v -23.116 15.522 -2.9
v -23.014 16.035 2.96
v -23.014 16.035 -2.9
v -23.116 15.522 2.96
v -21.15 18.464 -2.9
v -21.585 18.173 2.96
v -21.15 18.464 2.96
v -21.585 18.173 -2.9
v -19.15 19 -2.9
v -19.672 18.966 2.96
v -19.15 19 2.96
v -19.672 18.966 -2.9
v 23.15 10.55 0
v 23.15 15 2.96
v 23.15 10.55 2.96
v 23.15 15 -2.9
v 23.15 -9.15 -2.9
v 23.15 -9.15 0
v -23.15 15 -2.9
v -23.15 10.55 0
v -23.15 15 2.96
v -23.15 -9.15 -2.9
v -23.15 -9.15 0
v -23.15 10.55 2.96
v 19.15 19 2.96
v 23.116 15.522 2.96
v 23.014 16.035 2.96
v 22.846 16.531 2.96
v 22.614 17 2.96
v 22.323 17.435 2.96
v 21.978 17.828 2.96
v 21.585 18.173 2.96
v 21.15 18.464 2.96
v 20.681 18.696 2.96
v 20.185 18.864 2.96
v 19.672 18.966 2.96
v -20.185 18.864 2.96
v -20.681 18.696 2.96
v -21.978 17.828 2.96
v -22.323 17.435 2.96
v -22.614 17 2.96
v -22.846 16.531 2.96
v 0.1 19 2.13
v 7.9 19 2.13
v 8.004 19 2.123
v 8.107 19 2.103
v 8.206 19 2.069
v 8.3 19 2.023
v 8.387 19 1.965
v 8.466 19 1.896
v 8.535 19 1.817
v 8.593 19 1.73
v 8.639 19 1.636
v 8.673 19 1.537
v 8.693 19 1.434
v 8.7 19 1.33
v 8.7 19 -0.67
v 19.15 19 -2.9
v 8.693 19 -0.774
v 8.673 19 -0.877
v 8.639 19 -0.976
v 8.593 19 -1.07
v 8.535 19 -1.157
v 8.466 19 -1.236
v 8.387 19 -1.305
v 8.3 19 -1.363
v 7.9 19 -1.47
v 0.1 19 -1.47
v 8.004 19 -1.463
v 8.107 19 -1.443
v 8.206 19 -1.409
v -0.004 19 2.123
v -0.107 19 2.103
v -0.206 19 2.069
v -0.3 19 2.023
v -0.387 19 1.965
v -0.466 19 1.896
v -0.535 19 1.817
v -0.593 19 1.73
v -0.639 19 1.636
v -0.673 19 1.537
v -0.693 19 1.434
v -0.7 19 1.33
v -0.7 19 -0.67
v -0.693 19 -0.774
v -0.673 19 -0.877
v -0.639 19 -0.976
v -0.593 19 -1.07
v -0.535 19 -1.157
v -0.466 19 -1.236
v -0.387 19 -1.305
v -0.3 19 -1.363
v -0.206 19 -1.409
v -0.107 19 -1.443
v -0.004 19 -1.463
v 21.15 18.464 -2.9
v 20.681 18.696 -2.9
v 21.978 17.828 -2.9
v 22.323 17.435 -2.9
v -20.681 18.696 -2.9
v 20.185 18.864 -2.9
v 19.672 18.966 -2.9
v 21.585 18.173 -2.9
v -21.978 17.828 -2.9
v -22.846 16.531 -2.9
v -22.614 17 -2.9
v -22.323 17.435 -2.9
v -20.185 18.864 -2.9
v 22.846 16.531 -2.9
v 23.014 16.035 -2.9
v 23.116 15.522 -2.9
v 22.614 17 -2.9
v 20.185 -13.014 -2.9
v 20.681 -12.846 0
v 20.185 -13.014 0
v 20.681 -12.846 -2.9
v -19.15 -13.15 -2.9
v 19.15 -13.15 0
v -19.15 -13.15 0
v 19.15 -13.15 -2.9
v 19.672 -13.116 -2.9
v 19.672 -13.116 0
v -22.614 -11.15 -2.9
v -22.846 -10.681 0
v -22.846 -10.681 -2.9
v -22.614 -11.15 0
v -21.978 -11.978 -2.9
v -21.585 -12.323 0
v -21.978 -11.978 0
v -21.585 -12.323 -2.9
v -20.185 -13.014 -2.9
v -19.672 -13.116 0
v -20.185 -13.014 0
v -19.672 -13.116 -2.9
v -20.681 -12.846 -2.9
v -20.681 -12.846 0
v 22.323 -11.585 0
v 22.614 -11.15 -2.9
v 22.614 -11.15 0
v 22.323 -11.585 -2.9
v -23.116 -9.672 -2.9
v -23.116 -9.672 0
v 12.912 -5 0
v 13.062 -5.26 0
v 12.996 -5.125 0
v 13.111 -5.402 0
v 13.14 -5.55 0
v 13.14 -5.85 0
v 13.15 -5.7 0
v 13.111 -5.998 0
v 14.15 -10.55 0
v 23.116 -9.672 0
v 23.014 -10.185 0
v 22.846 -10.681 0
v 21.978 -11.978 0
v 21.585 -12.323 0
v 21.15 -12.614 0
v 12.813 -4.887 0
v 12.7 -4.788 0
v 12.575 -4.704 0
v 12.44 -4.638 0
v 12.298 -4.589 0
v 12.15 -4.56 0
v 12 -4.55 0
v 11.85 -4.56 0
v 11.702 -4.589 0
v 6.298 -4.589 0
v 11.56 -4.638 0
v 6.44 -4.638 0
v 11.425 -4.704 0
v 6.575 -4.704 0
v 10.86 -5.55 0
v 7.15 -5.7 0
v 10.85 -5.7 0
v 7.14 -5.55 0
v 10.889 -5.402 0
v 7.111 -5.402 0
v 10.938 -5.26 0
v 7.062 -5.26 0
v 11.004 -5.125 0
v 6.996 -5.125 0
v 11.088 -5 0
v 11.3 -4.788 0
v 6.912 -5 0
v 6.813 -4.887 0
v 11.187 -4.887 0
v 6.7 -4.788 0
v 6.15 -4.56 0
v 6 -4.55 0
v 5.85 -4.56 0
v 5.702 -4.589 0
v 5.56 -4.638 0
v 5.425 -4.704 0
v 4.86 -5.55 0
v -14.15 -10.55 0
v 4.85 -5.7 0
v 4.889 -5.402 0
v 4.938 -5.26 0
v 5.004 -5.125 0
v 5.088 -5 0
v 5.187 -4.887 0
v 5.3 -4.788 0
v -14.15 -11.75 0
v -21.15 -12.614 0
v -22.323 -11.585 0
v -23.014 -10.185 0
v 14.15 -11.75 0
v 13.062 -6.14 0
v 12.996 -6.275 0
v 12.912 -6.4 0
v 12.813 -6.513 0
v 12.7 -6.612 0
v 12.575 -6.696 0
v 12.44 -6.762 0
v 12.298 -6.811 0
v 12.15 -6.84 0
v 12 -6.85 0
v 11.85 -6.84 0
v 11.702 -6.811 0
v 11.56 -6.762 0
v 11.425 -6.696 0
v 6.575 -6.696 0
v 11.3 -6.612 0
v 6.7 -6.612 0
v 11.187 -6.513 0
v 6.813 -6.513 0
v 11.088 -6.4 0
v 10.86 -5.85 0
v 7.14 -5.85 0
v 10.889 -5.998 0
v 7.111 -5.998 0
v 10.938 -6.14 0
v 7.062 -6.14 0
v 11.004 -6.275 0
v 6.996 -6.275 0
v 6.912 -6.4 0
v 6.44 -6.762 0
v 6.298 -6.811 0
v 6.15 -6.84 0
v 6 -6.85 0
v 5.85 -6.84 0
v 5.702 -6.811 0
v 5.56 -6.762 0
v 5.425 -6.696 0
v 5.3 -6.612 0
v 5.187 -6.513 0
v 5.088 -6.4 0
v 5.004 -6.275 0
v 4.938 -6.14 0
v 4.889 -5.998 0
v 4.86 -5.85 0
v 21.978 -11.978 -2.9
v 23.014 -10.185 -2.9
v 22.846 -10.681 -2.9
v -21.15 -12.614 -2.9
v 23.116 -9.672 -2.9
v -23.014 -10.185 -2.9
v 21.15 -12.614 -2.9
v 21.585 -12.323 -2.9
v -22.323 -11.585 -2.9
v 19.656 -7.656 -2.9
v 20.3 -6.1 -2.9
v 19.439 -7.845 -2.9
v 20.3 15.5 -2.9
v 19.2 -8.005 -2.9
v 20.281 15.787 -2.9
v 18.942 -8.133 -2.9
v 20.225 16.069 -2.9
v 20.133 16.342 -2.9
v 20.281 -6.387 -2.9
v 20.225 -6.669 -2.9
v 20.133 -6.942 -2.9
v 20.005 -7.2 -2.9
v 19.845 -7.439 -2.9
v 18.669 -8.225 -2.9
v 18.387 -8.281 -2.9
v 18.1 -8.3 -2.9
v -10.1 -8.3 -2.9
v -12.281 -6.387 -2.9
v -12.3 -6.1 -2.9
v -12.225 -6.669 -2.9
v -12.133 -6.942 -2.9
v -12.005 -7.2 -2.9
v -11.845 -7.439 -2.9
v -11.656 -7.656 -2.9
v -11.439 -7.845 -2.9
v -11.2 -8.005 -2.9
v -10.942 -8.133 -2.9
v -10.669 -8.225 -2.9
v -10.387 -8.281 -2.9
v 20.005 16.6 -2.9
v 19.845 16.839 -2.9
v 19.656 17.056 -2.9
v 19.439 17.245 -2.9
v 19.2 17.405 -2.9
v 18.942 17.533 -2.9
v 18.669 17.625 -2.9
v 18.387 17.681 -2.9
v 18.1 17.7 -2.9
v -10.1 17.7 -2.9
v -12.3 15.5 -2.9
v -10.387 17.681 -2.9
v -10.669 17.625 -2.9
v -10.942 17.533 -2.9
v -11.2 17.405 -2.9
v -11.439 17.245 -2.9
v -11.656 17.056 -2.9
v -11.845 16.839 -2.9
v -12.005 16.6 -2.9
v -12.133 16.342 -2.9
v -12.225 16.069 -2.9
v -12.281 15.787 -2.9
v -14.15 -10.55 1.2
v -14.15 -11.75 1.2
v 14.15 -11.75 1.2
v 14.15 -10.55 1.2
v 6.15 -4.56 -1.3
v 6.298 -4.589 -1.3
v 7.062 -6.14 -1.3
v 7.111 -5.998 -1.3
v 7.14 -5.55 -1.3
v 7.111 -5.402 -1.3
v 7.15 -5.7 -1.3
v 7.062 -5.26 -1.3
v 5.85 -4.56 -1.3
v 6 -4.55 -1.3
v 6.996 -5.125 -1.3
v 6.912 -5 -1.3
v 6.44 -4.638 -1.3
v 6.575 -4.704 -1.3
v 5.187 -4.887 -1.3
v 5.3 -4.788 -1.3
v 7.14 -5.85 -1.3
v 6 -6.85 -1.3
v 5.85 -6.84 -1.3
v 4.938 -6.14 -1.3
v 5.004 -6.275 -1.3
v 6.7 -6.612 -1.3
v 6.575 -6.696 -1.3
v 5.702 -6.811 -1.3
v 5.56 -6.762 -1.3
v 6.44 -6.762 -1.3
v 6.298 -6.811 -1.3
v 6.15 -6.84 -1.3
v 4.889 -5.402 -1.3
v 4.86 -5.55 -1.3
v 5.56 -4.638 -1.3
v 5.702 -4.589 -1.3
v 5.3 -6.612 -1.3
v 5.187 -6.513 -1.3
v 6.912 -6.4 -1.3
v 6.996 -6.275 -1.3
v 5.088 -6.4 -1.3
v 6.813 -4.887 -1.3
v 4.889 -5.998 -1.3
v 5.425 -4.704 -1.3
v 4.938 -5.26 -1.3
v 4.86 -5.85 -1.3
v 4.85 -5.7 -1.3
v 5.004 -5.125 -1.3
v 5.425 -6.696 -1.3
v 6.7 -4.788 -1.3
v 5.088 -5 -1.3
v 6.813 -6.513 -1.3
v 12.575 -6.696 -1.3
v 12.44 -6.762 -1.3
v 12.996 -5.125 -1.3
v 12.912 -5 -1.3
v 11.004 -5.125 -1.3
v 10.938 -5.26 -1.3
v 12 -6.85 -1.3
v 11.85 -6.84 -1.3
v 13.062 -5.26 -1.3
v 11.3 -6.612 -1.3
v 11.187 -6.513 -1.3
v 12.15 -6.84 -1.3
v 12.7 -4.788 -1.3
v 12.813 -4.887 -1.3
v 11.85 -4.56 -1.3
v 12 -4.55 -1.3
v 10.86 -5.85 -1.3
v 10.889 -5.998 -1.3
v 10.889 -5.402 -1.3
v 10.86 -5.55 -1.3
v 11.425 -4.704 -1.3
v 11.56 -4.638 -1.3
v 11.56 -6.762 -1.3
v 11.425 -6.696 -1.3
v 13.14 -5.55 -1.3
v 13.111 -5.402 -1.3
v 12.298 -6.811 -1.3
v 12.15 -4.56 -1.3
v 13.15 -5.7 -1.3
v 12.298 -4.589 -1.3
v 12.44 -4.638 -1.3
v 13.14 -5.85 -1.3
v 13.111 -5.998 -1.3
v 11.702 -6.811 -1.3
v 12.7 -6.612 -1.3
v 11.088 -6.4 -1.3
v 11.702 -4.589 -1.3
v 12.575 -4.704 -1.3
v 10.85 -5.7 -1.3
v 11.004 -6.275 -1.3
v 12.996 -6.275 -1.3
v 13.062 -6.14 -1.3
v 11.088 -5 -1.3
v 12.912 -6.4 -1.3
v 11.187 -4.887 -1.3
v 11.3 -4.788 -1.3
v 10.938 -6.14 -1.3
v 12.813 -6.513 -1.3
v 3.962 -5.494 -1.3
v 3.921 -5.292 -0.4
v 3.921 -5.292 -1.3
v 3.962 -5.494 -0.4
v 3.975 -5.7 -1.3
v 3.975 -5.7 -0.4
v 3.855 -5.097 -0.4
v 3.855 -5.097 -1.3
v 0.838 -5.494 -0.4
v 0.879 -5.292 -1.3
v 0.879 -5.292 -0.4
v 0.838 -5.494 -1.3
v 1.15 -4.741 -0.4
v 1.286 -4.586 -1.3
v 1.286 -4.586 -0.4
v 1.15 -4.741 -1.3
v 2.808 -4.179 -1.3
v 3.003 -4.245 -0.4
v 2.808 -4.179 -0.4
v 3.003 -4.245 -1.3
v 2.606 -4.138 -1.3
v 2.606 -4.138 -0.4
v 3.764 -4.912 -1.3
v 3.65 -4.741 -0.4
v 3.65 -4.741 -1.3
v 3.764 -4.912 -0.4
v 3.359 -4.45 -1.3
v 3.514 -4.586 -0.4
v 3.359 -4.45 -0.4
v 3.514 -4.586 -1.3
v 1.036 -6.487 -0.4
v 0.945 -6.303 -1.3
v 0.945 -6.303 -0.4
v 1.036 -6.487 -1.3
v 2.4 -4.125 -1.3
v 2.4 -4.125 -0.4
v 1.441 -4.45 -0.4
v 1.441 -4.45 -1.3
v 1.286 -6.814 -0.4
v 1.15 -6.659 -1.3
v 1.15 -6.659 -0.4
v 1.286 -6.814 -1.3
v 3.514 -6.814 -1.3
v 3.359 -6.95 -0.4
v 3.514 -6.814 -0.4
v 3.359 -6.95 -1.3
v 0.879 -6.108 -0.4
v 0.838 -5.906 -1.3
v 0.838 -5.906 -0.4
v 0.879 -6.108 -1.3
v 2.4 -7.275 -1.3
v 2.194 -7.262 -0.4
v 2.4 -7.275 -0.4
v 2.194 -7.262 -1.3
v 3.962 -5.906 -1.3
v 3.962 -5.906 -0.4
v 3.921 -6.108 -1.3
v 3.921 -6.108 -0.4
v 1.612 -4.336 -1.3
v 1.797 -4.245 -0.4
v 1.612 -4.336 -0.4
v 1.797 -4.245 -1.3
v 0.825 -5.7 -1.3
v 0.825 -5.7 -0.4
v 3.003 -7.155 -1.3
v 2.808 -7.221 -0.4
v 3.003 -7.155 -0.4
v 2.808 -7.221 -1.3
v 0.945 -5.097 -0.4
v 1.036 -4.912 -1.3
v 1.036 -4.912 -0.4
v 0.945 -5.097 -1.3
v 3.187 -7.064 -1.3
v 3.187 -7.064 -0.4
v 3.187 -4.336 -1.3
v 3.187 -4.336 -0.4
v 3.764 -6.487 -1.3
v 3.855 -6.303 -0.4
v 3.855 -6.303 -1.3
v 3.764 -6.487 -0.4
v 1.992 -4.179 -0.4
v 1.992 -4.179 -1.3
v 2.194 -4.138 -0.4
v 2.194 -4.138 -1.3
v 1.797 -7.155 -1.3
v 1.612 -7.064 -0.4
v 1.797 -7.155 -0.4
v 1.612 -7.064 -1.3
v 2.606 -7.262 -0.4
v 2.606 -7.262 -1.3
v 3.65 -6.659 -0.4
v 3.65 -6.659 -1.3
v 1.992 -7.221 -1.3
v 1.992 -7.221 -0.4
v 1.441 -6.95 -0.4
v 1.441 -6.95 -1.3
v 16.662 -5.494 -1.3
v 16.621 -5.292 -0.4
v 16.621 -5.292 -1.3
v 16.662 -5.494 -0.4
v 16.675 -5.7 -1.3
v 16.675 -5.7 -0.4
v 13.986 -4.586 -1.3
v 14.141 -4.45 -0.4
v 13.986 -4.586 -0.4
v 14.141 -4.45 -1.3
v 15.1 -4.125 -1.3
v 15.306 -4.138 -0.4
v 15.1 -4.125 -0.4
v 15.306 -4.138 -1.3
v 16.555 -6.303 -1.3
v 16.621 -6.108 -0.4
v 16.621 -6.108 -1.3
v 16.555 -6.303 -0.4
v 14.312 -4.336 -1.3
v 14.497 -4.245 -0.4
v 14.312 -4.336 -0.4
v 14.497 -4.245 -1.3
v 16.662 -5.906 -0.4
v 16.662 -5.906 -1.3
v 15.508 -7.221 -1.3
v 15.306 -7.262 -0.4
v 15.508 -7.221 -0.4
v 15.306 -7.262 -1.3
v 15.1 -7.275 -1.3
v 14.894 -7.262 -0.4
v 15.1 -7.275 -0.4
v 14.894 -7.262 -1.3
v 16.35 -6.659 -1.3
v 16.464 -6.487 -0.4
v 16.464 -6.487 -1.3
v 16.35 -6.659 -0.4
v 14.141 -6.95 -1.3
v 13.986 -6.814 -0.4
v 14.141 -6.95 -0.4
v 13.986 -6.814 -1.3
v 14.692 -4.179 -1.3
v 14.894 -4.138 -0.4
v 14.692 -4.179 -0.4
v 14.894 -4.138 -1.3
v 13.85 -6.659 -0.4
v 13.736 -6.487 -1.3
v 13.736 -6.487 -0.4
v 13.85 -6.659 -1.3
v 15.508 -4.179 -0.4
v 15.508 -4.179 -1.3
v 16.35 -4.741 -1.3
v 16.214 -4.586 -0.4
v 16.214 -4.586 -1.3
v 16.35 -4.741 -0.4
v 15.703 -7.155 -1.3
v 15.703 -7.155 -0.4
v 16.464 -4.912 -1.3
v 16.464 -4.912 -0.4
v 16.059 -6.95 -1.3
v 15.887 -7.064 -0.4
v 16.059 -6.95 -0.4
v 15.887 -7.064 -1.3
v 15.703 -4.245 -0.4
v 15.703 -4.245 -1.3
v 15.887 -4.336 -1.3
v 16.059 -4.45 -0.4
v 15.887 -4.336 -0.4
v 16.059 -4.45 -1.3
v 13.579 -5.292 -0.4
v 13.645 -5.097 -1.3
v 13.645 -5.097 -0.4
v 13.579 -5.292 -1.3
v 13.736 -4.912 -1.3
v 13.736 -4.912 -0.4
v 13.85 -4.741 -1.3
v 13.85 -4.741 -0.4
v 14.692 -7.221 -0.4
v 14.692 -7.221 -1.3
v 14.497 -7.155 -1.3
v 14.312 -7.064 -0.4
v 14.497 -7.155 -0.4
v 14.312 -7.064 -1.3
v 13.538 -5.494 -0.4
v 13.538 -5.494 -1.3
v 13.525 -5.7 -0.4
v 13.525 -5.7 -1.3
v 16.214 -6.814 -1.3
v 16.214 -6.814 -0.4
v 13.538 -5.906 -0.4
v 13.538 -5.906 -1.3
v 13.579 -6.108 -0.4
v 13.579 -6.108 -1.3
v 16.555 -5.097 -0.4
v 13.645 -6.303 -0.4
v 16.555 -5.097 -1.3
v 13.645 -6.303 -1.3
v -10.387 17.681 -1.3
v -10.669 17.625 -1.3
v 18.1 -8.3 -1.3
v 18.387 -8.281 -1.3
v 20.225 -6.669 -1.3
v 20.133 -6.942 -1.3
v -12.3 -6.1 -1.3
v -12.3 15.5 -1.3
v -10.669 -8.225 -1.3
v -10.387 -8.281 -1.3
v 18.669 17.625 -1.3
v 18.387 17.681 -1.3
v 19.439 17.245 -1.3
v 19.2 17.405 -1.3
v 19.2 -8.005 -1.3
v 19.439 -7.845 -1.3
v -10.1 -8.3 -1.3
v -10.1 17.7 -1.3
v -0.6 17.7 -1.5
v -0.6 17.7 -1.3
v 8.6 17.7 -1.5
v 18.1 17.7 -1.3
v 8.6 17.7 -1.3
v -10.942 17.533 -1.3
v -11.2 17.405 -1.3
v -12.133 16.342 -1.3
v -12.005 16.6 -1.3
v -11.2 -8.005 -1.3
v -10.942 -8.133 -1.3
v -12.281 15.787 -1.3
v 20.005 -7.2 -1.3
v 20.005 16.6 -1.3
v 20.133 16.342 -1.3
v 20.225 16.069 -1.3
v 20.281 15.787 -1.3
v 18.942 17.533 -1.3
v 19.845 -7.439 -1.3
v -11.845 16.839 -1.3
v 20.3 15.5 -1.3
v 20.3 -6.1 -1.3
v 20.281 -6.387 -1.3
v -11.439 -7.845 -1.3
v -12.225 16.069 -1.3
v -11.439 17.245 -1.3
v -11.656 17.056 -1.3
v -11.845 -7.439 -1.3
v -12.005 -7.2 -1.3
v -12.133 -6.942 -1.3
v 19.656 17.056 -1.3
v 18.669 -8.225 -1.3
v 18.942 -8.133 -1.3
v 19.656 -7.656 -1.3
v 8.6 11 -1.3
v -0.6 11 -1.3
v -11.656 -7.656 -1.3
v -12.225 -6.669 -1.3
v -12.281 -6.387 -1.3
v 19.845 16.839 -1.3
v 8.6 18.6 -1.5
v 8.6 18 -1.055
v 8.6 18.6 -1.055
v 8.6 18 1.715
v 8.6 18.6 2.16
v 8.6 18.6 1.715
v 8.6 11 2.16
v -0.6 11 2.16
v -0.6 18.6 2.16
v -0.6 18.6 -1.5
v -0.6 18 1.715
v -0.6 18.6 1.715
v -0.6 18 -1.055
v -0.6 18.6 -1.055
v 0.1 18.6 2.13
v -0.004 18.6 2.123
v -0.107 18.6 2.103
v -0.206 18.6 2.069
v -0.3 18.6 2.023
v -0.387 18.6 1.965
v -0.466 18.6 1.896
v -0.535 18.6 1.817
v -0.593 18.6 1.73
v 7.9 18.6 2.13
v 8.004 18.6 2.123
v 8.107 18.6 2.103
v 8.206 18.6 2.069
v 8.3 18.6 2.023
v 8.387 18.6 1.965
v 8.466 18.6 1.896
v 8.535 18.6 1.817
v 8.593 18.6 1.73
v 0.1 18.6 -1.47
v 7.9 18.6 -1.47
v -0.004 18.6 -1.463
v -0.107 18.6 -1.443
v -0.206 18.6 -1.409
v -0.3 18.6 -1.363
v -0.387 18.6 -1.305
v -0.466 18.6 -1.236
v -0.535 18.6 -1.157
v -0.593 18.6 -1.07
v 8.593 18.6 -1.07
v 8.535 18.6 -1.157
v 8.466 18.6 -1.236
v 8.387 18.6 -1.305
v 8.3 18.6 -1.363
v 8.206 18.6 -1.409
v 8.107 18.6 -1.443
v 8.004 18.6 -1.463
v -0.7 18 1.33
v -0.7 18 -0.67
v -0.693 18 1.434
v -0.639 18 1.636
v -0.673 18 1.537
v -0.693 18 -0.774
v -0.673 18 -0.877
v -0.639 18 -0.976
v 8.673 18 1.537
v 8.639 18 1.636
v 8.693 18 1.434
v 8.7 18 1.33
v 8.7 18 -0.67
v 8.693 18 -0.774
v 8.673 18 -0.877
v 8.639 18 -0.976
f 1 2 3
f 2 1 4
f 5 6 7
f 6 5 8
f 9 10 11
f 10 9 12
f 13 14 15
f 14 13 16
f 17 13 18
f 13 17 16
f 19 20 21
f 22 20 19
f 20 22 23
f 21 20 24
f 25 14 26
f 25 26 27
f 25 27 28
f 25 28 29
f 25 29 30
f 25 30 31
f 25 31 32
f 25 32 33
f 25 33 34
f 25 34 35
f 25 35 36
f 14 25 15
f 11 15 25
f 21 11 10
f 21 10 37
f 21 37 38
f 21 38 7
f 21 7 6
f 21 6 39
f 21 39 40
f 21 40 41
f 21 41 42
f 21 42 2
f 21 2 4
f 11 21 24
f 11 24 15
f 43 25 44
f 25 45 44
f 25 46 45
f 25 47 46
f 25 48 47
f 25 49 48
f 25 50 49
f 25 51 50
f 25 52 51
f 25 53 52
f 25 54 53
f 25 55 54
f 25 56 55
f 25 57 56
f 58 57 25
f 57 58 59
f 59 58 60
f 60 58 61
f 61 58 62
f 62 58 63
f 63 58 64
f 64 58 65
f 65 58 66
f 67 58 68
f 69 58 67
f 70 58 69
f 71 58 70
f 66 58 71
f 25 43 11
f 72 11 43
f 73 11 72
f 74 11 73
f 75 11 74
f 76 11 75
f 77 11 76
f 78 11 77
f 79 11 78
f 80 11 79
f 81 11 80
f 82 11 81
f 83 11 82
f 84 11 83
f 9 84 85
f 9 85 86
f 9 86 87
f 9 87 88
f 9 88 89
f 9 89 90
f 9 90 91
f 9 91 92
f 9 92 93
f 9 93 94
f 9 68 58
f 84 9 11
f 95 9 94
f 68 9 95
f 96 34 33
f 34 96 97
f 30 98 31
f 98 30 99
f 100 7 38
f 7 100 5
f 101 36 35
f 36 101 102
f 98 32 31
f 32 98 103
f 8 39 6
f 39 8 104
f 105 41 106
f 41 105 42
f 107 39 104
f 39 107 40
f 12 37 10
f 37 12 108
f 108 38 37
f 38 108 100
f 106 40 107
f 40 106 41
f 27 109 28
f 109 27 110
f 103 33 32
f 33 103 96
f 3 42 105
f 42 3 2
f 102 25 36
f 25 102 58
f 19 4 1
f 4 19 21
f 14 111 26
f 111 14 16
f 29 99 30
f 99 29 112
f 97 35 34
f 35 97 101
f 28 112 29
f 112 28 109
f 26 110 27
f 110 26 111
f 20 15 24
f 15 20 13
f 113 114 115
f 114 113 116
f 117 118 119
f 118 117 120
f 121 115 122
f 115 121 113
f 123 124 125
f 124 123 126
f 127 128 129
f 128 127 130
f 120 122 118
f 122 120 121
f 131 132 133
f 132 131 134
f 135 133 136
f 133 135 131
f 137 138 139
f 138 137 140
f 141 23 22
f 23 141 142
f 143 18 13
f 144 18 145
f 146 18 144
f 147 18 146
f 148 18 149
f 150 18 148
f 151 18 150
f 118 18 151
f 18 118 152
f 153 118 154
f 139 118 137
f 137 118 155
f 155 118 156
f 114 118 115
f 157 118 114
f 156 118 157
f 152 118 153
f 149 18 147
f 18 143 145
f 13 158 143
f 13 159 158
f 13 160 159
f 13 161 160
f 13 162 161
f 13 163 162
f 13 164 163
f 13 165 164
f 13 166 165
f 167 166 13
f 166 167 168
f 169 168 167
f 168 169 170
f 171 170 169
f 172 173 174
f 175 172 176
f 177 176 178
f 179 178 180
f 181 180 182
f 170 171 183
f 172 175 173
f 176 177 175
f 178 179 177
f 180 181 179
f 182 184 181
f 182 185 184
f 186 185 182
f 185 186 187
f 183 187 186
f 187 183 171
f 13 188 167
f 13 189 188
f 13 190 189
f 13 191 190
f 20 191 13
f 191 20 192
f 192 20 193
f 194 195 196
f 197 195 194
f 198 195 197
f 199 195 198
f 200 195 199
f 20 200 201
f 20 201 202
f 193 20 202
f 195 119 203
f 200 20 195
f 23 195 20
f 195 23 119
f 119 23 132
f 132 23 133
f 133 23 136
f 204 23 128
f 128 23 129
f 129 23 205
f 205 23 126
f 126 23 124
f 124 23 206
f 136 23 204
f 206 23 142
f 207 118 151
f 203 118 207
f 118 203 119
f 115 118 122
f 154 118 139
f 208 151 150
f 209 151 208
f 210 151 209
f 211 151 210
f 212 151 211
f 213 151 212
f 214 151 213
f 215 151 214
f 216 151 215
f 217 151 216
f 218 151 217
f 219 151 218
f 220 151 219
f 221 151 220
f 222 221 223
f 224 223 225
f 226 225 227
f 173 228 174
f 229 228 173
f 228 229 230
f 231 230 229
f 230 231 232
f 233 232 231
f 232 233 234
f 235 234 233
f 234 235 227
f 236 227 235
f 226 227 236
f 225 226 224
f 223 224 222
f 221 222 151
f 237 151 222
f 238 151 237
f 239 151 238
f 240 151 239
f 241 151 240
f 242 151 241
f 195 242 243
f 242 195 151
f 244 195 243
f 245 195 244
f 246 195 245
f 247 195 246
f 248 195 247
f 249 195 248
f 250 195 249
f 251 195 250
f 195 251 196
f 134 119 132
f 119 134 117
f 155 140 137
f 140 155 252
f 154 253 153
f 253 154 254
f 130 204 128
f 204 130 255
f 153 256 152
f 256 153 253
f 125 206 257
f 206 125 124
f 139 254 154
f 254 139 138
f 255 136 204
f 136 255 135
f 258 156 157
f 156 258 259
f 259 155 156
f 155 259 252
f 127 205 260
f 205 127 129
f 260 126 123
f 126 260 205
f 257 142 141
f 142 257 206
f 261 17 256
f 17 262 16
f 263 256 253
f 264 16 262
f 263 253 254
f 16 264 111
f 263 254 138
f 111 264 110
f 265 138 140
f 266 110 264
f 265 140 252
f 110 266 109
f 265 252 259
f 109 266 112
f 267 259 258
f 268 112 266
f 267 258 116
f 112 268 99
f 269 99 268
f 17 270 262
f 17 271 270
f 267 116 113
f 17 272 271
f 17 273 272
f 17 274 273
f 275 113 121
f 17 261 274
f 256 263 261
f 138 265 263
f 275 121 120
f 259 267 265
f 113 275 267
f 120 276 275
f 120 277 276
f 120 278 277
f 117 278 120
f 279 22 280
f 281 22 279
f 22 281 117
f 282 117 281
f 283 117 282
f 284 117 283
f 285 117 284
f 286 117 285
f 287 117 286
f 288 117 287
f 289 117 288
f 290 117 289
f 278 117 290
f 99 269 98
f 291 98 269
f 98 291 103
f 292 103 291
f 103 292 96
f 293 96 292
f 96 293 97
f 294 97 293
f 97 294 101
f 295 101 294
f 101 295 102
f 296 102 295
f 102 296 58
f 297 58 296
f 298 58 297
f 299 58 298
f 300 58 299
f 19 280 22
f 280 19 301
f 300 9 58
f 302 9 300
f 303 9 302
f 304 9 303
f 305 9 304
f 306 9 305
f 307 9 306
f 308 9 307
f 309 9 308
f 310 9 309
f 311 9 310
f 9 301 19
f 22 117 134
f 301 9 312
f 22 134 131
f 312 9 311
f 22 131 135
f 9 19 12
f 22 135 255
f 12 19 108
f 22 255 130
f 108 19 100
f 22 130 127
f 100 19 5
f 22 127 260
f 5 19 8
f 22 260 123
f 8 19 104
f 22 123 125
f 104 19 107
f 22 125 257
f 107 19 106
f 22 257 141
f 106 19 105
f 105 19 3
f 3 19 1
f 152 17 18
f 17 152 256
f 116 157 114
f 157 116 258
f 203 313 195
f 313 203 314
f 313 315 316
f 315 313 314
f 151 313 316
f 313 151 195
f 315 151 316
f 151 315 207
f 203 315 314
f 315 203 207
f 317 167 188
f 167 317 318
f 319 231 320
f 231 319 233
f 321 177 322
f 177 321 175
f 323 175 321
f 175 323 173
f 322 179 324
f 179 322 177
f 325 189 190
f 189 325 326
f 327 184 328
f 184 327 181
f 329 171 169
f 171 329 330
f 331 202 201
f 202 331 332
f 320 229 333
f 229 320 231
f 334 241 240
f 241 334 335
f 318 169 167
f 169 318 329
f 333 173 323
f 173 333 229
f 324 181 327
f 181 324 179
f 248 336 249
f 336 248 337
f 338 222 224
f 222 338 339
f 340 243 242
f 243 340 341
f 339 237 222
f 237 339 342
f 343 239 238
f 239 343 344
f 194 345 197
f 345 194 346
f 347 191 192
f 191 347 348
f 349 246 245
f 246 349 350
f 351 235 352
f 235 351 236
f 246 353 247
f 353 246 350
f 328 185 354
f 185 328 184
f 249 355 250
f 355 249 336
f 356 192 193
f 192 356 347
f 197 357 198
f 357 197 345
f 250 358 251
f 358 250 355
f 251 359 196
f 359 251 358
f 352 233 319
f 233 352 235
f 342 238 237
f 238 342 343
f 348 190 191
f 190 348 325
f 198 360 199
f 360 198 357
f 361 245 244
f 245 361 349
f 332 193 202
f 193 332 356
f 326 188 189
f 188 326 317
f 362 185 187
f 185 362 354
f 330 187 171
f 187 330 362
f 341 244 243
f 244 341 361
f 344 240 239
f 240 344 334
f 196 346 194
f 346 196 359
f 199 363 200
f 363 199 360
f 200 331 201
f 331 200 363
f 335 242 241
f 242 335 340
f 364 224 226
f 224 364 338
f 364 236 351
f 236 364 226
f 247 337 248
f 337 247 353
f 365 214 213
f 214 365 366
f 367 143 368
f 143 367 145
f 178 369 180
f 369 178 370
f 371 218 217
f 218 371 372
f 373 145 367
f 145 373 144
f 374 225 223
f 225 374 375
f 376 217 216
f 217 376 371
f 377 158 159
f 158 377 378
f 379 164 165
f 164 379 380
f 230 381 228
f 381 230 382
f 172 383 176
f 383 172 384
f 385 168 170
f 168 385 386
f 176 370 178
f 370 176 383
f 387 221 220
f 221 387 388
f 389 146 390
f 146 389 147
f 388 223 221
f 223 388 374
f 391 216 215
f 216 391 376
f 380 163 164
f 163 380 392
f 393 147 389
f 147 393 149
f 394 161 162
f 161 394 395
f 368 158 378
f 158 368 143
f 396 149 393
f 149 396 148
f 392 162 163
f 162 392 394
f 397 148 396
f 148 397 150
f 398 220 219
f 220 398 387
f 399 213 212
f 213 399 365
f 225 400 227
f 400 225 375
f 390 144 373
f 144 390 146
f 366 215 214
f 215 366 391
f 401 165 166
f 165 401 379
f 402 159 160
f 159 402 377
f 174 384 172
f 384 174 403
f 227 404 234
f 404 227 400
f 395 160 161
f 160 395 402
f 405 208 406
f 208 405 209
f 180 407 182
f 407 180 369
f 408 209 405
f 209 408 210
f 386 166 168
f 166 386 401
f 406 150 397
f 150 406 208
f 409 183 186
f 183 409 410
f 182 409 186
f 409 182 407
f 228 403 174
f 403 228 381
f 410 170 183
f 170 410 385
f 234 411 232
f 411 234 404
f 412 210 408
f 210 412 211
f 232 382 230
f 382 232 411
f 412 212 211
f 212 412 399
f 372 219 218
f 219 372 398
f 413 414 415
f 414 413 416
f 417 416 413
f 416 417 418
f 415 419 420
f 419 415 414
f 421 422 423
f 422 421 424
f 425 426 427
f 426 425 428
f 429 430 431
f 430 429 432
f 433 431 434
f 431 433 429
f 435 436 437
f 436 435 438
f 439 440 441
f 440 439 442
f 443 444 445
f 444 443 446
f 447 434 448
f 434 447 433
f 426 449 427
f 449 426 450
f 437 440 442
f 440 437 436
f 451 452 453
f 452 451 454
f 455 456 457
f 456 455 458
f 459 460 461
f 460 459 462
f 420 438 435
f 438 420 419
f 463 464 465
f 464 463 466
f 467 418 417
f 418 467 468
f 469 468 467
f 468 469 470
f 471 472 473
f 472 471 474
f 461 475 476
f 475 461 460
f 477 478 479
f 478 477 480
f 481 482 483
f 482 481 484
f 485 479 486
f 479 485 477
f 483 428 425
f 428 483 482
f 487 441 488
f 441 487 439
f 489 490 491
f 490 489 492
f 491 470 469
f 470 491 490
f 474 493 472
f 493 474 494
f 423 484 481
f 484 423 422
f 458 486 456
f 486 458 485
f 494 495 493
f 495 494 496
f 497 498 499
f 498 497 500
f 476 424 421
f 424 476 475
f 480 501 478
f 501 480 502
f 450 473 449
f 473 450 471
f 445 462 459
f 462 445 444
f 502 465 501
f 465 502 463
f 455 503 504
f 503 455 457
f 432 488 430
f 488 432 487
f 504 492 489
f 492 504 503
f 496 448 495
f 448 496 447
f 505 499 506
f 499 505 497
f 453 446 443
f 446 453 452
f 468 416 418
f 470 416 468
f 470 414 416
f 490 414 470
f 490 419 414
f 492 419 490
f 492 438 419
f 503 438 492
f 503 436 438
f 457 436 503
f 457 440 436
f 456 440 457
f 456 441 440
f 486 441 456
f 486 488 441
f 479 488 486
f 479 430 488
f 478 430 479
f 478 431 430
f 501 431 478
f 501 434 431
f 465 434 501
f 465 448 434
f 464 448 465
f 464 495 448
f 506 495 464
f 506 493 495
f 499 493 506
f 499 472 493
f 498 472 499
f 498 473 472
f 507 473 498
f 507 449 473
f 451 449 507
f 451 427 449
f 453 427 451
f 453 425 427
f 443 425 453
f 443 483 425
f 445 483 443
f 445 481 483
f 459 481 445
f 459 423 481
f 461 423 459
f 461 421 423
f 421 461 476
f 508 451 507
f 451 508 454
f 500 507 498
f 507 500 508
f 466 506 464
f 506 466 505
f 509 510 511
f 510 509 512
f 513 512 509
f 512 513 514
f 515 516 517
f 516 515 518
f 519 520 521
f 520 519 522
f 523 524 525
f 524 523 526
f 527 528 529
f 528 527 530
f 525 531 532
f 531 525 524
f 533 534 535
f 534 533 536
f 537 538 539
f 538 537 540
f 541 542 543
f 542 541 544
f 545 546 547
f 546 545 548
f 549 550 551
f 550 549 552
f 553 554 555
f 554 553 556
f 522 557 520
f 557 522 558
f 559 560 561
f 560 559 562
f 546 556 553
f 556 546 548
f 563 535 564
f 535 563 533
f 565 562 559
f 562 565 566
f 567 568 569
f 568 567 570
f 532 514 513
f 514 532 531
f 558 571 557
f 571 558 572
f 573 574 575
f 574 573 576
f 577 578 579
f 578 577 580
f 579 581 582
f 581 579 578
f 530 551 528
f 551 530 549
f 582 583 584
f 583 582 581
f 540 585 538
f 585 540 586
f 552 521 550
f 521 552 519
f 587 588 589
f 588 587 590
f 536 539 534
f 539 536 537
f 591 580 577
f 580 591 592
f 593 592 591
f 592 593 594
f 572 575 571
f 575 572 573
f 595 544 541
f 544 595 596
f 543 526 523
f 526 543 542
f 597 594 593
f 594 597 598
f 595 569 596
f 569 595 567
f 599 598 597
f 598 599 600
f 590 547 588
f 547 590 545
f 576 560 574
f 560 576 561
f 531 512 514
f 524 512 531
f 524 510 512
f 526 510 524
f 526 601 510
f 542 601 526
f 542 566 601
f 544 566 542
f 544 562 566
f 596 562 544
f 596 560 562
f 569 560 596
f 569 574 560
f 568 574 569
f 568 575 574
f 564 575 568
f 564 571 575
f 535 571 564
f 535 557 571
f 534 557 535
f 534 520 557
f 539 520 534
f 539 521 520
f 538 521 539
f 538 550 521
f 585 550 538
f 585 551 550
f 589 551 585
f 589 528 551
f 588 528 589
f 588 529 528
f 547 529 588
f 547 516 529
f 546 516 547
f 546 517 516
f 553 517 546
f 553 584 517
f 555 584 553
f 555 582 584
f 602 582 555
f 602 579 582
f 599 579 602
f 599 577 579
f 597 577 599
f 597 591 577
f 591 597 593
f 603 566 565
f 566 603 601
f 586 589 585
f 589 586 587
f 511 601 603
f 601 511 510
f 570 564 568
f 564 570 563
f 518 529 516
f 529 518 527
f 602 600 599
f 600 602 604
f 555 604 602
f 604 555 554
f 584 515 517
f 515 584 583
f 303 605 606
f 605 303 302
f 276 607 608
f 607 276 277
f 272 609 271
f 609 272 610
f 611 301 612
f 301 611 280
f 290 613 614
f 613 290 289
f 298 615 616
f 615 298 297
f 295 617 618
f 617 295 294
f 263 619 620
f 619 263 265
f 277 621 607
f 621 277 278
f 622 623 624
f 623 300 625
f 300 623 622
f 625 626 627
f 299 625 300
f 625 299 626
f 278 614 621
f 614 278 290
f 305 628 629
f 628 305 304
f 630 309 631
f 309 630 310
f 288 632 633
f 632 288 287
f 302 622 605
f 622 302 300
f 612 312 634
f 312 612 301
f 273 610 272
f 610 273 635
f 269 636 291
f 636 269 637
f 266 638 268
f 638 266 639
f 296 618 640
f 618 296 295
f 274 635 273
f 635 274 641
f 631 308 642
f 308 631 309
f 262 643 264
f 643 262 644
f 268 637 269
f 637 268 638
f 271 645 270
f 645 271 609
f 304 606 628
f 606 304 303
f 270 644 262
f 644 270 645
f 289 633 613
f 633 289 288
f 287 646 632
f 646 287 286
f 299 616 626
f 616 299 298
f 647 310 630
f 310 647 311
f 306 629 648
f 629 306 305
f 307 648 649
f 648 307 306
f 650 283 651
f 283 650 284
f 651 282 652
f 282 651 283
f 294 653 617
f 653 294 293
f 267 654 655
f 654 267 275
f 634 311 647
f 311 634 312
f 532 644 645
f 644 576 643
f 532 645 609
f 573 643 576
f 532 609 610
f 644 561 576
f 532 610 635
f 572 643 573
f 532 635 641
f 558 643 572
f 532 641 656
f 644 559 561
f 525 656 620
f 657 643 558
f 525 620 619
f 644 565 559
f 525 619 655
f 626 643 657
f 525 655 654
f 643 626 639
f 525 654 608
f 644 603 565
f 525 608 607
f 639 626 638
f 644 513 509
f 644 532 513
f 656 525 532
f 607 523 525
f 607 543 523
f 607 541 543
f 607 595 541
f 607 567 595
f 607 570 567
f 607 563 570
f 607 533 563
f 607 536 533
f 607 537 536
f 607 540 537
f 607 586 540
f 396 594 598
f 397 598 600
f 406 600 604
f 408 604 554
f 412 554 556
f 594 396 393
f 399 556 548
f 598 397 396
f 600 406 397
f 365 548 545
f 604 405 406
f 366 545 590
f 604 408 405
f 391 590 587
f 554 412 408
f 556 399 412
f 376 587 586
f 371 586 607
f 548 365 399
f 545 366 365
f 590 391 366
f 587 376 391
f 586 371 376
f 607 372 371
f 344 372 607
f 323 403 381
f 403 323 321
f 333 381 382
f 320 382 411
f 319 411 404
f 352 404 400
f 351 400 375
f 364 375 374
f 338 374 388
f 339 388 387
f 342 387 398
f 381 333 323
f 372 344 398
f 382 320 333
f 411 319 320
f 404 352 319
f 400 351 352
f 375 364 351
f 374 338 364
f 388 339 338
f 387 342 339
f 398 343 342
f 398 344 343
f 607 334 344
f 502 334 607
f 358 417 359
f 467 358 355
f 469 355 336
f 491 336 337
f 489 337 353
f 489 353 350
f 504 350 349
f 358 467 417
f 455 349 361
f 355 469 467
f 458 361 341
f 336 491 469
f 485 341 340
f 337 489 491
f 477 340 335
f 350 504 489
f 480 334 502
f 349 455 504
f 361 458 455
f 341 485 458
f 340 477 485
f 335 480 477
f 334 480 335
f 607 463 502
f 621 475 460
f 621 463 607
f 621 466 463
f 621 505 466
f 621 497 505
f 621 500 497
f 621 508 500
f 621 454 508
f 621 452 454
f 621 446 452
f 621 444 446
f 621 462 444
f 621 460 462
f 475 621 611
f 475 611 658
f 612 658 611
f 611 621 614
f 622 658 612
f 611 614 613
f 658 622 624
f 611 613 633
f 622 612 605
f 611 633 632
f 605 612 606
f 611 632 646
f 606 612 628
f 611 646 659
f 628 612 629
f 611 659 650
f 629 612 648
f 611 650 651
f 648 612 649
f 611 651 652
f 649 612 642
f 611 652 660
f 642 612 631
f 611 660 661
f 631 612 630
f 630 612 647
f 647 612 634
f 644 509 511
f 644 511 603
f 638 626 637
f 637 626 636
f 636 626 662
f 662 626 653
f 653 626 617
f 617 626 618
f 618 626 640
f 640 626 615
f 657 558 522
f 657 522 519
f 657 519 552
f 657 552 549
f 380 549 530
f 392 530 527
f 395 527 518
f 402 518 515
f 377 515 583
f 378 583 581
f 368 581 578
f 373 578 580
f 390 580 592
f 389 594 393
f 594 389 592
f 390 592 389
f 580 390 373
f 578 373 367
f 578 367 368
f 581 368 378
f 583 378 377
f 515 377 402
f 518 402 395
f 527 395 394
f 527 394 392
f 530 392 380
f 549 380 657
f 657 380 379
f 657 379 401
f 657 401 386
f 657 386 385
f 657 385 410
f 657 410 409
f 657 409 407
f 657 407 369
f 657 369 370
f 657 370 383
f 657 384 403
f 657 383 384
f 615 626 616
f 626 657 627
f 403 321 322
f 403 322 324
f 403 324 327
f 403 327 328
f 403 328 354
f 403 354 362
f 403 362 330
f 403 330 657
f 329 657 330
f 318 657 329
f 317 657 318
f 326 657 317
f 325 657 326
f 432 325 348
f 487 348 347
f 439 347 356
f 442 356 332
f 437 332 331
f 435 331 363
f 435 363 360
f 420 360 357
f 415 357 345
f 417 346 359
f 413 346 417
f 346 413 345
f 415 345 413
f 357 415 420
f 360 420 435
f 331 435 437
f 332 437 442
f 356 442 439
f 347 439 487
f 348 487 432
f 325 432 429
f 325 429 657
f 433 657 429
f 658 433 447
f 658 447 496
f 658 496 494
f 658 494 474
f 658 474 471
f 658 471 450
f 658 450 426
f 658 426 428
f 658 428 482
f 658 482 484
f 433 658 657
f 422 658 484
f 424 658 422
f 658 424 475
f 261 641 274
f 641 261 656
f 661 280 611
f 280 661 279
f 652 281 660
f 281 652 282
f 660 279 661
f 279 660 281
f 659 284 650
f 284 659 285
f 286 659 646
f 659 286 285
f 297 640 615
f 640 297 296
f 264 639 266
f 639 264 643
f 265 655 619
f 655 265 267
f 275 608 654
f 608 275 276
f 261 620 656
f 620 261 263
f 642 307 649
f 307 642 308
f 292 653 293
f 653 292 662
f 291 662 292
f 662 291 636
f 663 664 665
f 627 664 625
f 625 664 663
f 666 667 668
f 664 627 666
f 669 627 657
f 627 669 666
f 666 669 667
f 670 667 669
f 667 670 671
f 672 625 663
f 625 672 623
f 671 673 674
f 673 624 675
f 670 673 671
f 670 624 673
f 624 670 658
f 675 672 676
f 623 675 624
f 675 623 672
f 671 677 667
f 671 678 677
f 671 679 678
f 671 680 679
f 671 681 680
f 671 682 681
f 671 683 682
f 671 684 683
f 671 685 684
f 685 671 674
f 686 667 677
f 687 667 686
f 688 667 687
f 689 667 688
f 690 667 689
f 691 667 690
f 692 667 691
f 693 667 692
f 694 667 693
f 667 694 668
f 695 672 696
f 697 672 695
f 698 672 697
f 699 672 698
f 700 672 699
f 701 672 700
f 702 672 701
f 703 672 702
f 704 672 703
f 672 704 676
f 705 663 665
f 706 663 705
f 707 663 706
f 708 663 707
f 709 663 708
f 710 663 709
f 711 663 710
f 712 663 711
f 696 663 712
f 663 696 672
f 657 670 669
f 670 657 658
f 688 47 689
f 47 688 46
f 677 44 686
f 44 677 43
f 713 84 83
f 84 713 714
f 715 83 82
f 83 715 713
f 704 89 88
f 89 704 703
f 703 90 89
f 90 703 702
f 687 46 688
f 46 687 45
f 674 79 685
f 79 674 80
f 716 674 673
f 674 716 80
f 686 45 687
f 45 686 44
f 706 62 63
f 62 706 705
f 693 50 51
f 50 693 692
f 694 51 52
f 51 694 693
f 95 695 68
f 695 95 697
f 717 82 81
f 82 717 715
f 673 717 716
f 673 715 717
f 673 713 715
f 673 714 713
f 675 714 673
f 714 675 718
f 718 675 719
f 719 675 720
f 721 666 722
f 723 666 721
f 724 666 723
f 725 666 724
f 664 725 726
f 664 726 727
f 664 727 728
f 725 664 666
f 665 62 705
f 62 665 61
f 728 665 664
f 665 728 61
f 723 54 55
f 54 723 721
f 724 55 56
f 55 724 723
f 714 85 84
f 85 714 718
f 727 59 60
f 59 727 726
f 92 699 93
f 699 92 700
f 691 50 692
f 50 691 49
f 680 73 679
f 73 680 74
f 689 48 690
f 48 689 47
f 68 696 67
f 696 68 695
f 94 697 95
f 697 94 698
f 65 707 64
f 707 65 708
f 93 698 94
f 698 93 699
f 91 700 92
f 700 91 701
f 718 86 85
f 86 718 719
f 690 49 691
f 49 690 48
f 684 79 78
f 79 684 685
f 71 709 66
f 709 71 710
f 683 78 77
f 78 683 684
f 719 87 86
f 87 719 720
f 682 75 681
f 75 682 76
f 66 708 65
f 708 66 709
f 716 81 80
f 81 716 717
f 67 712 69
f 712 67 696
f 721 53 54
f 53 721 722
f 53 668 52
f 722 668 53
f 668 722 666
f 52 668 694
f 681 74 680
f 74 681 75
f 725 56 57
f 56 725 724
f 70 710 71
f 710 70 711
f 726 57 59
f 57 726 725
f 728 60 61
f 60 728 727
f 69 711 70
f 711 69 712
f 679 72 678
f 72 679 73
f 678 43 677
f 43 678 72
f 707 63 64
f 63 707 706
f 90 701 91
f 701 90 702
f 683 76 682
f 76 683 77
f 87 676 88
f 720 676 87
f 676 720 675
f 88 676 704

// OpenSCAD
// Lift pod v2 charging dock: a small puck the pod drops onto.
//   - 2 spring pins (Kinghelm KH-204065-DZ, 6.5 mm free height) on the dock
//     board poke up through the pod's floor holes and press on its charging
//     pads with ~0.7 mm preload.
//   - 2 magnets (3 x 1.5 mm N52) sit under the pod's magnets, with the poles
//     flipped from one side to the other: the pod only snaps on the right way
//     round, so VIN can never meet GND. The magnets pass through 3.4 mm holes
//     in the dock board.
//   - USB-C on the dock's side (power only, 5.1k CC pull-downs on the board).
//     The side is the one place the band never goes: the band leaves the pod
//     at both ends and drapes over the dock's ends.
//
// Shared numbers must match lift_pod_v2.scad and podv2/placement.py.
// Assembly: magnets into their pockets from below (check poles against the
// pod first), dock board in from below (pins up through the holes, USB-C into
// its opening), then glue on the bottom plate (part = "plate").

part = "dock";   // "dock", "plate", "all"

pcb_l = 33.0;  pcb_w = 17.0;
dock_pads = [[22.5, 14.2], [28.5, 14.2]];   // pod J1: VIN, GND
magnets   = [[18.9, 14.2], [31.6, 14.2]];
body_l = 36.3;  body_w = 20.3;  plan_r = 4.0;   // pod body (without lugs)
pod_floor = 1.0;  pod_bay = 3.5;   // pod: floor + bay up to its board's pads

// dock board (dockv2/dock.kicad_pcb): 32 x 25.4 x 1.0 mm
// board x = pod-frame x + 12, board y = 17.4 - pod-frame y
dpcb = [32.0, 25.4, 1.0];
dpcb_c = [-12 + 32/2, 17.4 - 25.4/2];   // board centre in the pod frame
usb_x = 16.0 - 12;                      // USB-C centre (pod frame x), mouth at +Y
usb_open = [9.4, 3.6];  usb_h = 3.26;

pin_free = 6.5;  preload = 0.7;
top_t = 1.2;  mag_d = 3.0;  mag_t = 1.5;  plate_t = 1.2;
rail_h = 1.2;  rail_w = 1.2;
$fn = 48;

function pod(p) = [p[0] - pcb_l/2, pcb_w/2 - p[1]];
module rr(l, w, r) { offset(r = r) square([l - 2*r, w - 2*r], center = true); }

// z = 0 is the dock's top face, where the pod's floor rests
z_pcb_top = (pod_floor + pod_bay) + preload - pin_free;   // -1.3
z_pcb_bot = z_pcb_top - dpcb[2];                           // board underside
z_bot     = z_pcb_bot - 0.6 - plate_t;
X0 = -body_l/2 - 5;  X1 = body_l/2 + 5;
Y0 = -body_w/2 - 3;  Y1 = dpcb_c[1] + dpcb[1]/2 + 1.6;
side_h = z_pcb_top + usb_h + 1.0;       // raised block over the USB-C, beside the pod

module outline(grow = 0) {
    translate([(X0 + X1)/2, (Y0 + Y1)/2]) rr(X1 - X0 + 2*grow, Y1 - Y0 + 2*grow, 4 + grow);
}
module dock() {
    difference() {
        union() {
            translate([0, 0, z_bot + plate_t]) linear_extrude(-z_bot - plate_t) outline();
            // raised side block (USB-C housing), doubles as the pod's side stop
            intersection() {
                translate([0, 0, -0.01]) linear_extrude(side_h + 0.01) outline();
                translate([X0 - 1, body_w/2 + 0.4, -1]) cube([X1 - X0 + 2, Y1, side_h + 2]);
            }
            // low rail on the other long side
            translate([0, -(body_w/2 + rail_w/2 + 0.4), 0]) linear_extrude(rail_h) square([body_l - 8, rail_w], center = true);
        }
        // cavity for the board (open at the bottom)
        translate([dpcb_c[0], dpcb_c[1], z_bot]) linear_extrude(z_pcb_top - z_bot)
            rr(dpcb[0] + 0.6, dpcb[1] + 0.6, 2.2);
        // room for the USB-C body above the board, inside the side block
        translate([usb_x, Y1 - 3.7 - 0.5, z_pcb_top + usb_h/2]) cube([9.2, 7.6, usb_h + 0.4], center = true);
        // USB-C opening in the side wall
        translate([usb_x, Y1 - 1, z_pcb_top + usb_h/2]) rotate([-90, 0, 0])
            linear_extrude(3) offset(r = 0.8) square([usb_open[0] - 1.6, usb_open[1] - 1.6], center = true);
        // pin holes; magnet pockets from below with a 0.4 mm top skin
        for (p = dock_pads) { q = pod(p); translate([q[0], q[1], -5]) cylinder(d = 2.3, h = 10); }
        for (p = magnets)   { q = pod(p); translate([q[0], q[1], -0.4 - mag_t - 3]) cylinder(d = mag_d + 0.15, h = mag_t + 3); }
    }
}
module plate() {   // bottom cover, glued on; recesses for 4 small rubber feet
    difference() {
        linear_extrude(plate_t) outline(-0.15);
        for (sx = [-1, 1], sy = [0, 1]) translate([sx*(body_l/2), Y0 + 3 + sy*(Y1 - Y0 - 6), plate_t - 0.4])
            cylinder(d = 6, h = 1);
    }
}
if (part == "dock") dock();
if (part == "plate") plate();
if (part == "all") { color("#111111") dock(); color("#222222") translate([0, -(Y1 - Y0) - 8, z_bot]) plate(); }
echo(str("dock: ", X1 - X0, " x ", Y1 - Y0, " mm, ", -z_bot + side_h, " mm tall at the USB side, ", -z_bot, " mm elsewhere"));
